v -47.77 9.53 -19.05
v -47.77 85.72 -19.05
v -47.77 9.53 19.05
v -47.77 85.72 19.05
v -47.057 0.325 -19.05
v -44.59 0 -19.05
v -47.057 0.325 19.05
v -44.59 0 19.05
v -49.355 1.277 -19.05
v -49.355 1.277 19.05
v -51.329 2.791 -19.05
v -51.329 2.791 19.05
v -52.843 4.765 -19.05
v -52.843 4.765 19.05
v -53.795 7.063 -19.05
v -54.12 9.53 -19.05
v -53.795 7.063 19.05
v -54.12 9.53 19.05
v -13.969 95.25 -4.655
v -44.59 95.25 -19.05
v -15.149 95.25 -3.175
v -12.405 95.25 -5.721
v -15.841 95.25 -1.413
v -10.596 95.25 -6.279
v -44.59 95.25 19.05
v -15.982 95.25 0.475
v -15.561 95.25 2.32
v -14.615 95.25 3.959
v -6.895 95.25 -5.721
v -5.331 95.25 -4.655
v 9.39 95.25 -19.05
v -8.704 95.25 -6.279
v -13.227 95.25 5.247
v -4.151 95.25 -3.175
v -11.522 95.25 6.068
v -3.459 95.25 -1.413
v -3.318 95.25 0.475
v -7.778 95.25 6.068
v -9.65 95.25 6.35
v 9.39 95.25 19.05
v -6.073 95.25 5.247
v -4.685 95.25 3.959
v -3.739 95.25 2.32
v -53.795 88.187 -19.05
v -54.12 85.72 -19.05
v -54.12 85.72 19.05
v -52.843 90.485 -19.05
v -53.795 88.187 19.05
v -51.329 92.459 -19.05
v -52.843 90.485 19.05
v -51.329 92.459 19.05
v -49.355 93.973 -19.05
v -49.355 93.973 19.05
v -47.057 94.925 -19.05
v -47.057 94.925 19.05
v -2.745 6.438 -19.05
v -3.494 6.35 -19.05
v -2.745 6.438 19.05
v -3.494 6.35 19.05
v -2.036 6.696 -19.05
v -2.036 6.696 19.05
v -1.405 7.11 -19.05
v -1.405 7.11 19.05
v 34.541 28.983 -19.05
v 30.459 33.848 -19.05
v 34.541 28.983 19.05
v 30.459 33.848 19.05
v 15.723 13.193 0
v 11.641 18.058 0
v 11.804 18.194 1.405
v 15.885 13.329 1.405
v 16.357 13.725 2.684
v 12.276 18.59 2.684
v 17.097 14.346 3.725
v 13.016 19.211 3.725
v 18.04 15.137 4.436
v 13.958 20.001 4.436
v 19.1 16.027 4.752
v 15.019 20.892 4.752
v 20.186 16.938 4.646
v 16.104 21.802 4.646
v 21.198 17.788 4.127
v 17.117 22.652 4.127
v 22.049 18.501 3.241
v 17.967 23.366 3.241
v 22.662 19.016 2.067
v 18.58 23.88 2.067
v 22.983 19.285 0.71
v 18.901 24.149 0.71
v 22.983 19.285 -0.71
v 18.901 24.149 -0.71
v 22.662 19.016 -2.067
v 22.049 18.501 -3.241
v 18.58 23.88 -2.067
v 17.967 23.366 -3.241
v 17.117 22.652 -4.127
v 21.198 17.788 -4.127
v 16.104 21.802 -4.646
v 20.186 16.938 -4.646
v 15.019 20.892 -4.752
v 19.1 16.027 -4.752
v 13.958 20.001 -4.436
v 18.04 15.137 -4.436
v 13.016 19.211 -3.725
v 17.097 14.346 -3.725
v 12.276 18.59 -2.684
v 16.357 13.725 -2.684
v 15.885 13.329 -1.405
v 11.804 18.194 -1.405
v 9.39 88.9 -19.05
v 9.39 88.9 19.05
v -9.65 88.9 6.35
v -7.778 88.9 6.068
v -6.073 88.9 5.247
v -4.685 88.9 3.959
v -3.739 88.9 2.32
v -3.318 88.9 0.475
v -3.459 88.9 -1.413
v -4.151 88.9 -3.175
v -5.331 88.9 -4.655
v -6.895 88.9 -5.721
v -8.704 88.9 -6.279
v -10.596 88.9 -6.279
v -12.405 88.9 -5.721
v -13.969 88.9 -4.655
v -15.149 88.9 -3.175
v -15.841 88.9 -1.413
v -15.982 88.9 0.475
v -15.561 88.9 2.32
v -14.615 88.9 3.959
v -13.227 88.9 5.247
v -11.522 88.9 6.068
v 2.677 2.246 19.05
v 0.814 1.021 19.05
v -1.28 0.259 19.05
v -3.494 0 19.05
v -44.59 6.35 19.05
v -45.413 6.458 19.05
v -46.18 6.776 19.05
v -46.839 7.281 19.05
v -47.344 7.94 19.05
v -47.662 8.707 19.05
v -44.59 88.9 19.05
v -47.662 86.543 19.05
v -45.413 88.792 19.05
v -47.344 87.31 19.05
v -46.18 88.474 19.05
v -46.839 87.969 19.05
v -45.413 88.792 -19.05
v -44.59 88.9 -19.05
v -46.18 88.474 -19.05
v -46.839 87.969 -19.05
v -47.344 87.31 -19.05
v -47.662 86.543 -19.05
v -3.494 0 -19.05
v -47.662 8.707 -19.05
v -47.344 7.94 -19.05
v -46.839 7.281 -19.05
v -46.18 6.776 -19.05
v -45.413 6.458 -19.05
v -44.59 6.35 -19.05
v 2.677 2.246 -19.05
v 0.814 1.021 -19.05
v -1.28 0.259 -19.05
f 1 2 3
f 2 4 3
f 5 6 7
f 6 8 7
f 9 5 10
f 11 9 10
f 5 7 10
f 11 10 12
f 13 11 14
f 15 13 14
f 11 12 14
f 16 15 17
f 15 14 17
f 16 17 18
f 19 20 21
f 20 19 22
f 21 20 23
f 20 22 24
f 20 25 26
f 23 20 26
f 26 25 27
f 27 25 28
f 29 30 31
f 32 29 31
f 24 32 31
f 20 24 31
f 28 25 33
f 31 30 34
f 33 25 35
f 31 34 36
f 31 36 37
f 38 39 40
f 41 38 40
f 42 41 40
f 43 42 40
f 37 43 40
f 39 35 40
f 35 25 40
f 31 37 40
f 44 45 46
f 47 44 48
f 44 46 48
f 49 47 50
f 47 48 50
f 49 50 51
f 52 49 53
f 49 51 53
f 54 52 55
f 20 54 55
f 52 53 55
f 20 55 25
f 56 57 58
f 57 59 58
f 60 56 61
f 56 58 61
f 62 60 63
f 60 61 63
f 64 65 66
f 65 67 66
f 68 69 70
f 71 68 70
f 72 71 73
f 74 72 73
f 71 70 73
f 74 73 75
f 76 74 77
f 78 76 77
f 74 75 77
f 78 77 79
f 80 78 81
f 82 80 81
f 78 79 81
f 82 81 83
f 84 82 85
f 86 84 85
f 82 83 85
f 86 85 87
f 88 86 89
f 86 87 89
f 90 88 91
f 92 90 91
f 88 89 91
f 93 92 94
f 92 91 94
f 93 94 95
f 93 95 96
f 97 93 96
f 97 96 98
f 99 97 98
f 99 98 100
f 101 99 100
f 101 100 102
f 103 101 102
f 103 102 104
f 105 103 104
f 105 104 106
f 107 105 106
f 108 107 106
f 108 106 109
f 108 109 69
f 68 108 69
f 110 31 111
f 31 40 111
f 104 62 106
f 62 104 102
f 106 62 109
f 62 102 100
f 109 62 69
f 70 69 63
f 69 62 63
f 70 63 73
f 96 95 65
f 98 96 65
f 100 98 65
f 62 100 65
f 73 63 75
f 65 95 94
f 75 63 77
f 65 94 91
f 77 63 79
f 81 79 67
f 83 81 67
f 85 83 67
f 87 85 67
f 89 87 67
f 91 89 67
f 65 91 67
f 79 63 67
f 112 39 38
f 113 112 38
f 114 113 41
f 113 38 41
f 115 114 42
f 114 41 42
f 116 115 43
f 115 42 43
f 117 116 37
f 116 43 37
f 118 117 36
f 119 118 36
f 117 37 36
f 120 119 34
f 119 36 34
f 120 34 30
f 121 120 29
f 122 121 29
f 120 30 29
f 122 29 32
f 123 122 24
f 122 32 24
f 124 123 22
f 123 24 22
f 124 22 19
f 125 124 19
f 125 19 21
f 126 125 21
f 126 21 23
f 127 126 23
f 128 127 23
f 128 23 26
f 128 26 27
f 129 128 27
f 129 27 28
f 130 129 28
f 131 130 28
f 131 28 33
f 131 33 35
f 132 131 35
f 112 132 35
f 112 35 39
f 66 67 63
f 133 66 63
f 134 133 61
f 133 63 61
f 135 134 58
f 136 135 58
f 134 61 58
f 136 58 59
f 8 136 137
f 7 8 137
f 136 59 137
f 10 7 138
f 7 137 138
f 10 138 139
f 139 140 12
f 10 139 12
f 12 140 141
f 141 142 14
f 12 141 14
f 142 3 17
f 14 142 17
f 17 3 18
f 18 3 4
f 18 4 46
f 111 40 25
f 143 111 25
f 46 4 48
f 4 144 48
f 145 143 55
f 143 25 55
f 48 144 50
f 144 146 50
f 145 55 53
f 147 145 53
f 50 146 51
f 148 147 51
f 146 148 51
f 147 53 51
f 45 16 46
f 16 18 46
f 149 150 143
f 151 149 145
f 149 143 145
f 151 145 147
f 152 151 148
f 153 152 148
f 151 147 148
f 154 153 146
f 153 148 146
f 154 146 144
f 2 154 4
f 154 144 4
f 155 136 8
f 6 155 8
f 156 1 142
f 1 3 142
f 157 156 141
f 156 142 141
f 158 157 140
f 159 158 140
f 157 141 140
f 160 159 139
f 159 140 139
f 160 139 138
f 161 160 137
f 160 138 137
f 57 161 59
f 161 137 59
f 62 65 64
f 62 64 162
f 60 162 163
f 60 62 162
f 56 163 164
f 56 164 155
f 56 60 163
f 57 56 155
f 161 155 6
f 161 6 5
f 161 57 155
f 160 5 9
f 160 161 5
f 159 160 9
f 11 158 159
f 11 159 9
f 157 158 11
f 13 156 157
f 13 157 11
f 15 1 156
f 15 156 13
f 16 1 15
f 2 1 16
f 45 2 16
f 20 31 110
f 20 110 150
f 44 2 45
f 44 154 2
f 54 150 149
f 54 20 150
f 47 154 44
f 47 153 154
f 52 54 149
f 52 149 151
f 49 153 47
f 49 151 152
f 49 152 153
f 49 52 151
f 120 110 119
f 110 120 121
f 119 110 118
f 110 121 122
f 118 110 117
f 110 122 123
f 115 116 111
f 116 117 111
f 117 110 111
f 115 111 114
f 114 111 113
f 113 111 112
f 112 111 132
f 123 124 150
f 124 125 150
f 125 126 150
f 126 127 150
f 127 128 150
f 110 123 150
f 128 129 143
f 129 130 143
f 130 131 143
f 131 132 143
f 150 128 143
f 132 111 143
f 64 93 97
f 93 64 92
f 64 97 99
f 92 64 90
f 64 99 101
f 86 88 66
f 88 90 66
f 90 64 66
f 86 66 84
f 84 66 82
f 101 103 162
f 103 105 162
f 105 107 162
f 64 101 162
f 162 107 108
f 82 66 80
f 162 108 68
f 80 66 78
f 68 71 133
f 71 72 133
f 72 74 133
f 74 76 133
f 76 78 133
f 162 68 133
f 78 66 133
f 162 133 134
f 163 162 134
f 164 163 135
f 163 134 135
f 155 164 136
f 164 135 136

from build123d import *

# Parameters (mm, degrees)
BOSS_EXTRUDE1_DEPTH = 19.05
SKETCH2_R           = 6.35
CUT_EXTRUDE1_DEPTH  = 21.43
SKETCH3_R           = 4.765
CUT_EXTRUDE2_DEPTH  = 46.1


with BuildPart() as part:
    # Sketch1 → Boss-Extrude1 (new, symmetric)
    with BuildSketch(Plane.XY):
        with BuildLine():
            Line((-3.494114249, 0), (-44.59, 0))
            ThreePointArc((-44.59, 0), (-51.328727625, 2.791272375), (-54.12, 9.53))
            Line((-54.12, 9.53), (-54.12, 85.72))
            ThreePointArc((-54.12, 85.72), (-51.328727625, 92.458727625), (-44.59, 95.25))
            Line((-44.59, 95.25), (9.39, 95.25))
            Line((9.39, 95.25), (9.39, 88.9))
            Line((9.39, 88.9), (-44.59, 88.9))
            ThreePointArc((-44.59, 88.9), (-46.838599564, 87.968599564), (-47.77, 85.72))
            Line((-47.77, 85.72), (-47.77, 9.53))
            ThreePointArc((-47.77, 9.53), (-46.838599564, 7.281400436), (-44.59, 6.35))
            Line((-44.59, 6.35), (-3.494114249, 6.35))
            ThreePointArc((-3.494114249, 6.35), (-2.382548783, 6.545998982), (-1.405054517, 7.11035556))
            Line((-1.405054517, 7.11035556), (30.459242619, 33.847675535))
            Line((30.459242619, 33.847675535), (34.54094394, 28.983293321))
            Line((34.54094394, 28.983293321), (2.676646804, 2.245973346))
            ThreePointArc((2.676646804, 2.245973346), (-0.210720873, 0.57895084), (-3.494114249, 0))
        make_face()
    extrude(amount=BOSS_EXTRUDE1_DEPTH, both=True)

    # Sketch2 → Cut-Extrude1 (cut)
    with BuildSketch(Plane(origin=(0, 95.25, 0), x_dir=(1, 0, 0), z_dir=(0, 1, 0))):
        with Locations(Location((-9.65, 0, 0), (0, 0, 270))):
            Circle(SKETCH2_R)
    extrude(amount=-CUT_EXTRUDE1_DEPTH, mode=Mode.SUBTRACT)

    # Sketch3 → Cut-Extrude2 (cut)
    with BuildSketch(Plane(origin=(-4.081701322, 4.864382214, 0), x_dir=(0.7660444431189815, 0.6427876096865353, 0), z_dir=(-0.6427876096865353, 0.7660444431189815, 0))):
        with Locations(Location((25.29, 0, 0), (0, 0, 180))):
            Circle(SKETCH3_R)
    extrude(amount=-CUT_EXTRUDE2_DEPTH, mode=Mode.SUBTRACT)


solid = part.part
